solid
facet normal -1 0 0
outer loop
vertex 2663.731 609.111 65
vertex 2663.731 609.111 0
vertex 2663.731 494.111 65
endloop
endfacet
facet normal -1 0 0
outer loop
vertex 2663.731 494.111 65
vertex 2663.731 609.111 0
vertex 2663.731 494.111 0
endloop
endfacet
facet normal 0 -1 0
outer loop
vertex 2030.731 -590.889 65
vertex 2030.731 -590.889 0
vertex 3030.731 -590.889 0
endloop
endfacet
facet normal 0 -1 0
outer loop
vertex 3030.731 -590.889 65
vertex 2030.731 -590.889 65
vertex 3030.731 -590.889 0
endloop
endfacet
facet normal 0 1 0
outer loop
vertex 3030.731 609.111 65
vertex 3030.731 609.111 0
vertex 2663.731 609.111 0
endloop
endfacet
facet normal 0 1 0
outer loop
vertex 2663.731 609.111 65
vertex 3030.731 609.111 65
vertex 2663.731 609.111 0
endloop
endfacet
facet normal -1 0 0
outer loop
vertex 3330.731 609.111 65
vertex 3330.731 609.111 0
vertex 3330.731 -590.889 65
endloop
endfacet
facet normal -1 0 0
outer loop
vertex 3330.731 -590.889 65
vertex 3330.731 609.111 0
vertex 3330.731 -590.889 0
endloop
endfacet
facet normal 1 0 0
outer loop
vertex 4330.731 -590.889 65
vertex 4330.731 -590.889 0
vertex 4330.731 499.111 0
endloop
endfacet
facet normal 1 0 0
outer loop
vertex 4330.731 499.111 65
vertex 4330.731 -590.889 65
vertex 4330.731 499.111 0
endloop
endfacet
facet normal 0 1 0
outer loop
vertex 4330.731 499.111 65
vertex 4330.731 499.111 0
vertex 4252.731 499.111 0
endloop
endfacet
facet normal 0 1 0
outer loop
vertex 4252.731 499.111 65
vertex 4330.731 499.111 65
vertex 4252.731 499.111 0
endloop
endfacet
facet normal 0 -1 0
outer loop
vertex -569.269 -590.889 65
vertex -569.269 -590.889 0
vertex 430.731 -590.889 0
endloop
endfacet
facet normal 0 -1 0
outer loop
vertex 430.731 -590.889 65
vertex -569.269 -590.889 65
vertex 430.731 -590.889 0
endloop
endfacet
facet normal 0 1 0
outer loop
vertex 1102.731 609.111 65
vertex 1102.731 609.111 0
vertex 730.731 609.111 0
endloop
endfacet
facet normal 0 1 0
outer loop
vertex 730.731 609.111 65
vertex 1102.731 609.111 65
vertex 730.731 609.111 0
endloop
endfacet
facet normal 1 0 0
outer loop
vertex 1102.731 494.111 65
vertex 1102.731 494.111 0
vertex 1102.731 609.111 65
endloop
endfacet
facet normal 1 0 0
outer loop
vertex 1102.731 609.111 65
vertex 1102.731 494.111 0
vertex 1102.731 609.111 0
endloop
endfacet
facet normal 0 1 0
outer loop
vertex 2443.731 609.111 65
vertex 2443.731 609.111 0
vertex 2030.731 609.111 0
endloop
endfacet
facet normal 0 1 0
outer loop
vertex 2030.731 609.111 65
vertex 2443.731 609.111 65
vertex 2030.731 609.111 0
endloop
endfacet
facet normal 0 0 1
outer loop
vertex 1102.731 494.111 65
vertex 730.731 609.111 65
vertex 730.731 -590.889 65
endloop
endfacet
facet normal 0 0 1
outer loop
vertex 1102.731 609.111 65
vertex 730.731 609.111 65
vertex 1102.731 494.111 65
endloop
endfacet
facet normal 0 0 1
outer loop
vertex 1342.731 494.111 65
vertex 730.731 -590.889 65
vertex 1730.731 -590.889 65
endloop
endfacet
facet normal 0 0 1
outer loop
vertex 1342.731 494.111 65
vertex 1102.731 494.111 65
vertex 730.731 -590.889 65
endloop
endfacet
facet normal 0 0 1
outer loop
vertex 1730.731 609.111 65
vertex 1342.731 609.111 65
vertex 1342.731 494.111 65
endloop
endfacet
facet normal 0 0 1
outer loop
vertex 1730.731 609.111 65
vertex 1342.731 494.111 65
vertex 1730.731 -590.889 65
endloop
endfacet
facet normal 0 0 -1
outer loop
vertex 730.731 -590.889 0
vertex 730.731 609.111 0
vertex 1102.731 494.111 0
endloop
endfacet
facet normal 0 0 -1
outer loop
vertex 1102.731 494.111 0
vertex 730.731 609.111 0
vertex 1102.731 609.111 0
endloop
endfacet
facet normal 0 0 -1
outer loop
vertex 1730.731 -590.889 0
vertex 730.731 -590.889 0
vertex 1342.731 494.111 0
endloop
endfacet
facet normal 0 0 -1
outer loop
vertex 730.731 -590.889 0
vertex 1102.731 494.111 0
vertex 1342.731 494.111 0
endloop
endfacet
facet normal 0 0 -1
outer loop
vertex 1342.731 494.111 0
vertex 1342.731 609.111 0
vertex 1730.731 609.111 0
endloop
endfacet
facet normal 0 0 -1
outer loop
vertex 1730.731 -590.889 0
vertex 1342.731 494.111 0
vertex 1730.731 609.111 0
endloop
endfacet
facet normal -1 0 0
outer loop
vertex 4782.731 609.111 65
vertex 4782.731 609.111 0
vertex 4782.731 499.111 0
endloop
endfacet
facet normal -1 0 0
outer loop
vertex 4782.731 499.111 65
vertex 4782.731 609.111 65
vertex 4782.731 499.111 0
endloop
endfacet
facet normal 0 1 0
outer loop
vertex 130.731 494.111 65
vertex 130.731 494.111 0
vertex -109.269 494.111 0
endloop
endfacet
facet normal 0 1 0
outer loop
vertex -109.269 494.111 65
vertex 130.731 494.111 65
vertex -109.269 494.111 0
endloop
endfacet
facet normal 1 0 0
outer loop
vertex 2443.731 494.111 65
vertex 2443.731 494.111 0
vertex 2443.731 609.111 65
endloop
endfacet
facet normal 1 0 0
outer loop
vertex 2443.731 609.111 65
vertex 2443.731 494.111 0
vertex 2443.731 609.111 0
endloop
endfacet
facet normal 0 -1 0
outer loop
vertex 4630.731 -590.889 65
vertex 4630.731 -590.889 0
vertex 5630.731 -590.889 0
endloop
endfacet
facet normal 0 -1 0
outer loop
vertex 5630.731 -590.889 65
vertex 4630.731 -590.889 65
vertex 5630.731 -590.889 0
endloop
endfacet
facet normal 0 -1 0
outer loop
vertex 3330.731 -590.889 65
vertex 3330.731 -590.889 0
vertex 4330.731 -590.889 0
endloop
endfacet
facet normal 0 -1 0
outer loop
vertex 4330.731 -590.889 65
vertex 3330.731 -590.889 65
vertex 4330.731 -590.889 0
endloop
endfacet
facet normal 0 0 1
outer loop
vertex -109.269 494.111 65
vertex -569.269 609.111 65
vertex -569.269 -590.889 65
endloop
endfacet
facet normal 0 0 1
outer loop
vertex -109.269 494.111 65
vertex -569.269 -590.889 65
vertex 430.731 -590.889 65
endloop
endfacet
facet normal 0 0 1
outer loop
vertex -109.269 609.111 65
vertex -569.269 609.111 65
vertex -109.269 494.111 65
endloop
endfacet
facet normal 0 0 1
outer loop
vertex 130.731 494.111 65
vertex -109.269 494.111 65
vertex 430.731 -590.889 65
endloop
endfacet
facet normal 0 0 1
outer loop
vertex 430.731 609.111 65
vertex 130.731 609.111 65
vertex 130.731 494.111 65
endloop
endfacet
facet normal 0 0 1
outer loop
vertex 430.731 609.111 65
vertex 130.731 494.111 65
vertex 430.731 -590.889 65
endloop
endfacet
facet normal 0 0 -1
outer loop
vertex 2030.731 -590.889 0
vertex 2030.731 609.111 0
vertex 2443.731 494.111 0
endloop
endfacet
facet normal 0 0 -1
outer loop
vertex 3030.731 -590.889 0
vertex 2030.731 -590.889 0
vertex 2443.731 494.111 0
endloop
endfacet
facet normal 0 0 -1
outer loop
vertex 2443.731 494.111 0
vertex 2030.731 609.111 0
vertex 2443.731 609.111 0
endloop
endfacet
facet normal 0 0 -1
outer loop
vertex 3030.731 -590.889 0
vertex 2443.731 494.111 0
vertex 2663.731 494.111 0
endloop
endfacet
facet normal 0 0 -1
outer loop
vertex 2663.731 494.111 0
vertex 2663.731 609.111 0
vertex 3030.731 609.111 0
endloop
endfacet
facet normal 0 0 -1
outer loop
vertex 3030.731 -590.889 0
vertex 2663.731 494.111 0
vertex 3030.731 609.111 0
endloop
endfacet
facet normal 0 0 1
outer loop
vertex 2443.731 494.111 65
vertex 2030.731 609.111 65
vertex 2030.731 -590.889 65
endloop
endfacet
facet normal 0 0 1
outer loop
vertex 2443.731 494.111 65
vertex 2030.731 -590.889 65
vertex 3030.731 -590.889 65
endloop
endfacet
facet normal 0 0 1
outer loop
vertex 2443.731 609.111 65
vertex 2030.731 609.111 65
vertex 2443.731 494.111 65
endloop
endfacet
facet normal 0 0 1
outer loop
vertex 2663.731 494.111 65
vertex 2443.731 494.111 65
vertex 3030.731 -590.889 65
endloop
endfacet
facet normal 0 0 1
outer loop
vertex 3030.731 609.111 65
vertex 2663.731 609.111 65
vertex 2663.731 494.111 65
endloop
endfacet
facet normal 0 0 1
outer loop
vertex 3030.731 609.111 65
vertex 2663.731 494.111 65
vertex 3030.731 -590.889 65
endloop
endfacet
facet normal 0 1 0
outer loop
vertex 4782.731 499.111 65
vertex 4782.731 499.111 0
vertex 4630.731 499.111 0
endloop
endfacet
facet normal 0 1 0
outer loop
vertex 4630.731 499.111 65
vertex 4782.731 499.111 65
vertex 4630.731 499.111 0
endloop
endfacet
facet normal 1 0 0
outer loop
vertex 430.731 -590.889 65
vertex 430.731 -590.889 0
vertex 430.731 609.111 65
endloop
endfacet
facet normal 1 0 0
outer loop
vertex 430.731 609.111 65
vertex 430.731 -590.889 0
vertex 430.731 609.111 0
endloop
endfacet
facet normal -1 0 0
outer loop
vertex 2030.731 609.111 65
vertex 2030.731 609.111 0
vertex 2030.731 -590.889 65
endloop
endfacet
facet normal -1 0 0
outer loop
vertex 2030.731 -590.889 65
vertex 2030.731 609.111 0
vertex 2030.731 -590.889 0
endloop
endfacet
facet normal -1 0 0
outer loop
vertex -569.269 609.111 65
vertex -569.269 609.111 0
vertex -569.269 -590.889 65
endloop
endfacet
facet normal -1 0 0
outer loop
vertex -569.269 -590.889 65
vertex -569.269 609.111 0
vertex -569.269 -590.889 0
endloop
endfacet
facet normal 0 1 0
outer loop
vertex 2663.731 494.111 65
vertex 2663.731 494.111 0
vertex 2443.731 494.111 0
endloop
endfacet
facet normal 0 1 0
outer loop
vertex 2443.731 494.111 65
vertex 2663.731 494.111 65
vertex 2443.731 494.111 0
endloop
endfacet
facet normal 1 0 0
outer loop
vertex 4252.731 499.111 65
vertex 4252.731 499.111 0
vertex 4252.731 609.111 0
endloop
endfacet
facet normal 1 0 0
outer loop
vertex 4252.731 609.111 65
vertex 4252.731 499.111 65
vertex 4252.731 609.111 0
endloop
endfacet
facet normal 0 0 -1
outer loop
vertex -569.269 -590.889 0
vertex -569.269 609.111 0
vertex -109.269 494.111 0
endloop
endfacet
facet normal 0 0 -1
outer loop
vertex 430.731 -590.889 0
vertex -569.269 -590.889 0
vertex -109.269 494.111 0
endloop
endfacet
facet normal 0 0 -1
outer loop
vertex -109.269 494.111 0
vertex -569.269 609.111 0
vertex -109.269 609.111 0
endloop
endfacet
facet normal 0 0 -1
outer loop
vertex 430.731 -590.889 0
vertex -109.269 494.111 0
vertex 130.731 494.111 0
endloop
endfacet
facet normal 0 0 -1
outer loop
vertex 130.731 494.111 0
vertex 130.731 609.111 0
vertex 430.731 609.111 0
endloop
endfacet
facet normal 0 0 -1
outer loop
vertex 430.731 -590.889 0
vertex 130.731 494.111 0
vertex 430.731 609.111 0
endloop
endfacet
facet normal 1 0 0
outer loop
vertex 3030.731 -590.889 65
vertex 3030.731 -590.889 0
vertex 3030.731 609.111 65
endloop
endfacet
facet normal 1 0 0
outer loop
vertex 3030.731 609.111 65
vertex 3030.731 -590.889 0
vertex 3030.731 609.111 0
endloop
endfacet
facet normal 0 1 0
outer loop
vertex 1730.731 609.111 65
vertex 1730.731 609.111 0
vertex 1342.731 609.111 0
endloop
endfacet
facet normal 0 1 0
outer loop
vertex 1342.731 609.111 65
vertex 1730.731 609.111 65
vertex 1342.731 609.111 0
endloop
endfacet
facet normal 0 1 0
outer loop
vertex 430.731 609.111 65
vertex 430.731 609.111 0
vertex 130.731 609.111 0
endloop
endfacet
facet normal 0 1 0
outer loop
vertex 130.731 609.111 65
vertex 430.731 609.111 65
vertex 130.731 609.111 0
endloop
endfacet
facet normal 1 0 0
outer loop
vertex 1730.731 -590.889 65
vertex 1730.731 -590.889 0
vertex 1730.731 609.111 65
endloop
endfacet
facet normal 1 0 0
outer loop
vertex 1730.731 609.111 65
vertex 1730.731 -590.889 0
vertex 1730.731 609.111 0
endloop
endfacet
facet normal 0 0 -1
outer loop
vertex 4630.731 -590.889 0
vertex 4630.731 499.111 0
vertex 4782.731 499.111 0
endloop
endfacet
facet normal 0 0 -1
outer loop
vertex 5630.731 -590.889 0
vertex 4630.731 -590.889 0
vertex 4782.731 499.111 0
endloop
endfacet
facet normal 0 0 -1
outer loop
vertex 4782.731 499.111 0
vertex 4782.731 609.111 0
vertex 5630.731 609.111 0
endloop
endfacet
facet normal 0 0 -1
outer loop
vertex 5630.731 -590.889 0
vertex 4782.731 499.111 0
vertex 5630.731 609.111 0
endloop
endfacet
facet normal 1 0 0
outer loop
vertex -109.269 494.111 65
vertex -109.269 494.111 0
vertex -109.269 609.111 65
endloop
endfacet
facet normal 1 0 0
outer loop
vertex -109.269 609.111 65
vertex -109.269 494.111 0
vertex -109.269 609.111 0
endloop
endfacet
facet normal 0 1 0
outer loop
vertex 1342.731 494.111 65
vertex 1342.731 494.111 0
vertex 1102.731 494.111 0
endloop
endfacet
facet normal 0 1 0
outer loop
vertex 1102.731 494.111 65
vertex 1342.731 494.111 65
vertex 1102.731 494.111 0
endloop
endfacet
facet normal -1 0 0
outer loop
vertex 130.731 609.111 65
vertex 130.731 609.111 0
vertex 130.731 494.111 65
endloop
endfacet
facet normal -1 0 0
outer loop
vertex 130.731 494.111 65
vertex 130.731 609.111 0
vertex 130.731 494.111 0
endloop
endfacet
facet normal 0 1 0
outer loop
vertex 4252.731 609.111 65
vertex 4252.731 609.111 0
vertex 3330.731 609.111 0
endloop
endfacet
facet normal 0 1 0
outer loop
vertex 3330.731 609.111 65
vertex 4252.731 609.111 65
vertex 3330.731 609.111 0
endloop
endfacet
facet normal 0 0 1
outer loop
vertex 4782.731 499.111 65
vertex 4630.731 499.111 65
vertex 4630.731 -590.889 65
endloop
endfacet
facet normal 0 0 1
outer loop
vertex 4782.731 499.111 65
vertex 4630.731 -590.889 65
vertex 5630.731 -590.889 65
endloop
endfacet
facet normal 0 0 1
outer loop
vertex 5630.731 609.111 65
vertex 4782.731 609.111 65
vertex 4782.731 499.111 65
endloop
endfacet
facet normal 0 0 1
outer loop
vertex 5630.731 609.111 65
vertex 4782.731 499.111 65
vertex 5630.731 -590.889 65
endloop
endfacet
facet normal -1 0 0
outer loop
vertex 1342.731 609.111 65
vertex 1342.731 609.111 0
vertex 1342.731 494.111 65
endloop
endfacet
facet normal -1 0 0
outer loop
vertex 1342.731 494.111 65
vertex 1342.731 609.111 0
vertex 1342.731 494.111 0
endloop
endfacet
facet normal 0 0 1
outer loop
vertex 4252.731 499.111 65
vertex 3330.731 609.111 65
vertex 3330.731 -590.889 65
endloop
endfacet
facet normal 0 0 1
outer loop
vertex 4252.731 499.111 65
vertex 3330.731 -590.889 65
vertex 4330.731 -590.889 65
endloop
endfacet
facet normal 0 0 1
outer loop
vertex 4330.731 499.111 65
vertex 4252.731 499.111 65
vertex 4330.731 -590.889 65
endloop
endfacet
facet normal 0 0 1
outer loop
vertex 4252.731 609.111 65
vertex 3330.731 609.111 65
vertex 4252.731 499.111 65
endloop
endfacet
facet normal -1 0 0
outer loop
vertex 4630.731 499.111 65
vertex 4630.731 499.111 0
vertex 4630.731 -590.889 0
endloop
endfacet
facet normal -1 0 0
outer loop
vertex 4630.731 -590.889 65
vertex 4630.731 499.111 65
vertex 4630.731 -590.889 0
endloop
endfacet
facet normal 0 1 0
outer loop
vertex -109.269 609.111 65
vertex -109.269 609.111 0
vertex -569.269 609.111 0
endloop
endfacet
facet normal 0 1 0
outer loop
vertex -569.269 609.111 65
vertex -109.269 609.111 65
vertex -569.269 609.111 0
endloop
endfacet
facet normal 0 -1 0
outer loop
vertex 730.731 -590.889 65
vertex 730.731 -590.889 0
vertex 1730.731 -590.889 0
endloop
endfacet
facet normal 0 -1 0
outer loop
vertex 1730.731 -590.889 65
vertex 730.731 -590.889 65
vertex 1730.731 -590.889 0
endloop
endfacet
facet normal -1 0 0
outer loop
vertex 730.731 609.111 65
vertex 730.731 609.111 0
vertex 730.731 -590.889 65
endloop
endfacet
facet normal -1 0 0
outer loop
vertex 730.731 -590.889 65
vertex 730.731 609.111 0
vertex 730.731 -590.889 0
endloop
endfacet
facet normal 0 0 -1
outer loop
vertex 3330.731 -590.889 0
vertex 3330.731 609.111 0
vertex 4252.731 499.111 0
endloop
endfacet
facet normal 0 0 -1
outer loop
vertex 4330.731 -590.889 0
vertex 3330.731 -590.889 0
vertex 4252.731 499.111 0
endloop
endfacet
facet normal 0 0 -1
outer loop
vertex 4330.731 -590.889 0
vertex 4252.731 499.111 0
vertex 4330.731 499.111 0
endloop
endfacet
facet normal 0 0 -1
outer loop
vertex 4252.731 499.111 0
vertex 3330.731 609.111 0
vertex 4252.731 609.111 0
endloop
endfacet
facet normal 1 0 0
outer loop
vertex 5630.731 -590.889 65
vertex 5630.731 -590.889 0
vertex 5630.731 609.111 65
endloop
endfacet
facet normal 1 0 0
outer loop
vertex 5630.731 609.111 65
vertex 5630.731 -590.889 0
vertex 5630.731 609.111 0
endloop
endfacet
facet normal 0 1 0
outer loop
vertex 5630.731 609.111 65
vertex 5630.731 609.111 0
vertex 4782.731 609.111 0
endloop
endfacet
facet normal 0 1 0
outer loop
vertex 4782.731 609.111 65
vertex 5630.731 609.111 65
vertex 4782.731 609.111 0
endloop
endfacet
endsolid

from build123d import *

# Parameters (mm, degrees)
F1_DEPTH = 65


with BuildPart() as f1:
    # F0 (on Top) → F1 (new body)
    with BuildSketch(Plane.XY):
        Polygon((-109.269322, 609.110825), (-569.269322, 609.110825), (-569.269322, -590.889175), (430.730678, -590.889175), (430.730678, 609.110825), (130.730678, 609.110825), (130.730678, 494.110825), (-109.269322, 494.110825), align=None)
        Polygon((1102.730678, 609.110825), (730.730678, 609.110825), (730.730678, -590.889175), (1730.730678, -590.889175), (1730.730678, 609.110825), (1342.730678, 609.110825), (1342.730678, 494.110825), (1102.730678, 494.110825), align=None)
        Polygon((2443.730678, 609.110825), (2030.730678, 609.110825), (2030.730678, -590.889175), (3030.730678, -590.889175), (3030.730678, 609.110825), (2663.730678, 609.110825), (2663.730678, 494.110825), (2443.730678, 494.110825), align=None)
        Polygon((4252.730678, 609.110825), (3330.730678, 609.110825), (3330.730678, -590.889175), (4330.730678, -590.889175), (4330.730678, 499.110825), (4252.730678, 499.110825), align=None)
        Polygon((5630.730678, 609.110825), (4782.730678, 609.110825), (4782.730678, 499.110825), (4630.730678, 499.110825), (4630.730678, -590.889175), (5630.730678, -590.889175), align=None)
    extrude(amount=F1_DEPTH)


solid = f1.part
